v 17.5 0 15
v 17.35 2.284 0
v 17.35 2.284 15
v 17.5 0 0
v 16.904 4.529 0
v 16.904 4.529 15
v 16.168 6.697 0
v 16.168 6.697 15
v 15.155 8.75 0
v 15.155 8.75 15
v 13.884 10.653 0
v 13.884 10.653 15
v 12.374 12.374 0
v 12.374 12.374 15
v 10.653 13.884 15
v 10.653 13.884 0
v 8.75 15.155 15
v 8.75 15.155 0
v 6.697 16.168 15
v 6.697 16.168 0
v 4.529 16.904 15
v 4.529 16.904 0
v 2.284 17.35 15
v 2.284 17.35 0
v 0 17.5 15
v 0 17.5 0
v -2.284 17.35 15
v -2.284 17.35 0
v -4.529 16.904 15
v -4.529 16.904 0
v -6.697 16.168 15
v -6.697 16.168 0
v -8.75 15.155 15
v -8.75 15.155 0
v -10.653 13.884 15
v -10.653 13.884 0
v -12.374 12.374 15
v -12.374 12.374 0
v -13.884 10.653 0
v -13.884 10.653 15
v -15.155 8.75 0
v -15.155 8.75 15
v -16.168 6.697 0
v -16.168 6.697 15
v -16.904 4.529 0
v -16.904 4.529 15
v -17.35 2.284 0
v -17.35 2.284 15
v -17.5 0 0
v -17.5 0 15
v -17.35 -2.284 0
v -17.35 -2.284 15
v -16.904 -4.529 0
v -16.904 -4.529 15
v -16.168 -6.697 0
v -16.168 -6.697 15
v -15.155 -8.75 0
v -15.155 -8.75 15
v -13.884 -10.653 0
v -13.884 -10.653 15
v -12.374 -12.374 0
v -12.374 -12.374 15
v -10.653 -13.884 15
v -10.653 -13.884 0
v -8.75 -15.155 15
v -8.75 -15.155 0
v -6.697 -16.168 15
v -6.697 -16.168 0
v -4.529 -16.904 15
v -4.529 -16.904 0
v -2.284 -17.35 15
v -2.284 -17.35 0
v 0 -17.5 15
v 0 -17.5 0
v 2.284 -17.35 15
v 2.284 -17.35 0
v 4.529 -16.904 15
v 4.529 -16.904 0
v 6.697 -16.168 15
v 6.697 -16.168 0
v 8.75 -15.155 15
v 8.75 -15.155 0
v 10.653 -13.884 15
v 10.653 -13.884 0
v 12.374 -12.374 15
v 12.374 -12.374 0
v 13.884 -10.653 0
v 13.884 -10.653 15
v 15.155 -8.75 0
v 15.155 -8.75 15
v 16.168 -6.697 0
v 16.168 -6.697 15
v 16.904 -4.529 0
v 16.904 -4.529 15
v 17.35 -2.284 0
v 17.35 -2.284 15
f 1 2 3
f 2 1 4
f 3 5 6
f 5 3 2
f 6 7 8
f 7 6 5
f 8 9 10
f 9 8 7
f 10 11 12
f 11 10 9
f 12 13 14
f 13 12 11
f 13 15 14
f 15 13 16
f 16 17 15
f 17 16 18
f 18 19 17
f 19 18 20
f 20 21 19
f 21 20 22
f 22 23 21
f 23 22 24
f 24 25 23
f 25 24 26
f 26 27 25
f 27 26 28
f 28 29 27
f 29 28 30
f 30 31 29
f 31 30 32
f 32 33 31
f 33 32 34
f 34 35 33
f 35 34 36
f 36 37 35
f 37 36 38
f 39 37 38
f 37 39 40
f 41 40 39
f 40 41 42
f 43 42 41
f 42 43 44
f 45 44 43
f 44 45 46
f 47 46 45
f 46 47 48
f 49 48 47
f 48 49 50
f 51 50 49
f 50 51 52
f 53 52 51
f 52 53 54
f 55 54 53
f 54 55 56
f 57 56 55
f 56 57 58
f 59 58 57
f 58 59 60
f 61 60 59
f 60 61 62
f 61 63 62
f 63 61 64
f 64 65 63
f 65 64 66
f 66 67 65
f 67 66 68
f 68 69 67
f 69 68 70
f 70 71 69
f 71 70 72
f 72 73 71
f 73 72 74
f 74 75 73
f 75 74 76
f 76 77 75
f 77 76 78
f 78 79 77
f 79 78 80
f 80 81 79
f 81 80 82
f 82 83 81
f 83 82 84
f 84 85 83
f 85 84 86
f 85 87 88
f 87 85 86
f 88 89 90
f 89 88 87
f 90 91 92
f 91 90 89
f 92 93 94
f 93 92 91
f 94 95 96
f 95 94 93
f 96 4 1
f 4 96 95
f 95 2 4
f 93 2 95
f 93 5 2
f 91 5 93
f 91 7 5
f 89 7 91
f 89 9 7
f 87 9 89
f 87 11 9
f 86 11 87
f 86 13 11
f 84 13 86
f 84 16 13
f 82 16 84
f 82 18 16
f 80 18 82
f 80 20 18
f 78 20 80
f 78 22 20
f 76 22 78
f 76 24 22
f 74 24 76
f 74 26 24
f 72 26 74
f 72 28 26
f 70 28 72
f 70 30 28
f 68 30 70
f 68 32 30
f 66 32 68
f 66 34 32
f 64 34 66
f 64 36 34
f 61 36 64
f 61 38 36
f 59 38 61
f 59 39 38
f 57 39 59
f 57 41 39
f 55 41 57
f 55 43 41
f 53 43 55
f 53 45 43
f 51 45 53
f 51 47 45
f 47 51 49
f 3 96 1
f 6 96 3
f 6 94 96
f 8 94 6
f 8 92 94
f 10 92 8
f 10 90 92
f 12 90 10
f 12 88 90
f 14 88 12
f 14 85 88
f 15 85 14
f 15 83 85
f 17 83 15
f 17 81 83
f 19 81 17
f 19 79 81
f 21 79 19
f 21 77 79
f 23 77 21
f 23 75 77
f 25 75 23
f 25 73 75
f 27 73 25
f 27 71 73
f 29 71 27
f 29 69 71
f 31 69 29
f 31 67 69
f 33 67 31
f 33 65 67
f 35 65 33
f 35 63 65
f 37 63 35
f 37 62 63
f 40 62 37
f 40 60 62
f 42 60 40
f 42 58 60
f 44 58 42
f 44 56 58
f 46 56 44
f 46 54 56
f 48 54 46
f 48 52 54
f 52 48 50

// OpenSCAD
module beacon_puck() { cylinder(h=15, d=35, $fn=48); }
beacon_puck();
